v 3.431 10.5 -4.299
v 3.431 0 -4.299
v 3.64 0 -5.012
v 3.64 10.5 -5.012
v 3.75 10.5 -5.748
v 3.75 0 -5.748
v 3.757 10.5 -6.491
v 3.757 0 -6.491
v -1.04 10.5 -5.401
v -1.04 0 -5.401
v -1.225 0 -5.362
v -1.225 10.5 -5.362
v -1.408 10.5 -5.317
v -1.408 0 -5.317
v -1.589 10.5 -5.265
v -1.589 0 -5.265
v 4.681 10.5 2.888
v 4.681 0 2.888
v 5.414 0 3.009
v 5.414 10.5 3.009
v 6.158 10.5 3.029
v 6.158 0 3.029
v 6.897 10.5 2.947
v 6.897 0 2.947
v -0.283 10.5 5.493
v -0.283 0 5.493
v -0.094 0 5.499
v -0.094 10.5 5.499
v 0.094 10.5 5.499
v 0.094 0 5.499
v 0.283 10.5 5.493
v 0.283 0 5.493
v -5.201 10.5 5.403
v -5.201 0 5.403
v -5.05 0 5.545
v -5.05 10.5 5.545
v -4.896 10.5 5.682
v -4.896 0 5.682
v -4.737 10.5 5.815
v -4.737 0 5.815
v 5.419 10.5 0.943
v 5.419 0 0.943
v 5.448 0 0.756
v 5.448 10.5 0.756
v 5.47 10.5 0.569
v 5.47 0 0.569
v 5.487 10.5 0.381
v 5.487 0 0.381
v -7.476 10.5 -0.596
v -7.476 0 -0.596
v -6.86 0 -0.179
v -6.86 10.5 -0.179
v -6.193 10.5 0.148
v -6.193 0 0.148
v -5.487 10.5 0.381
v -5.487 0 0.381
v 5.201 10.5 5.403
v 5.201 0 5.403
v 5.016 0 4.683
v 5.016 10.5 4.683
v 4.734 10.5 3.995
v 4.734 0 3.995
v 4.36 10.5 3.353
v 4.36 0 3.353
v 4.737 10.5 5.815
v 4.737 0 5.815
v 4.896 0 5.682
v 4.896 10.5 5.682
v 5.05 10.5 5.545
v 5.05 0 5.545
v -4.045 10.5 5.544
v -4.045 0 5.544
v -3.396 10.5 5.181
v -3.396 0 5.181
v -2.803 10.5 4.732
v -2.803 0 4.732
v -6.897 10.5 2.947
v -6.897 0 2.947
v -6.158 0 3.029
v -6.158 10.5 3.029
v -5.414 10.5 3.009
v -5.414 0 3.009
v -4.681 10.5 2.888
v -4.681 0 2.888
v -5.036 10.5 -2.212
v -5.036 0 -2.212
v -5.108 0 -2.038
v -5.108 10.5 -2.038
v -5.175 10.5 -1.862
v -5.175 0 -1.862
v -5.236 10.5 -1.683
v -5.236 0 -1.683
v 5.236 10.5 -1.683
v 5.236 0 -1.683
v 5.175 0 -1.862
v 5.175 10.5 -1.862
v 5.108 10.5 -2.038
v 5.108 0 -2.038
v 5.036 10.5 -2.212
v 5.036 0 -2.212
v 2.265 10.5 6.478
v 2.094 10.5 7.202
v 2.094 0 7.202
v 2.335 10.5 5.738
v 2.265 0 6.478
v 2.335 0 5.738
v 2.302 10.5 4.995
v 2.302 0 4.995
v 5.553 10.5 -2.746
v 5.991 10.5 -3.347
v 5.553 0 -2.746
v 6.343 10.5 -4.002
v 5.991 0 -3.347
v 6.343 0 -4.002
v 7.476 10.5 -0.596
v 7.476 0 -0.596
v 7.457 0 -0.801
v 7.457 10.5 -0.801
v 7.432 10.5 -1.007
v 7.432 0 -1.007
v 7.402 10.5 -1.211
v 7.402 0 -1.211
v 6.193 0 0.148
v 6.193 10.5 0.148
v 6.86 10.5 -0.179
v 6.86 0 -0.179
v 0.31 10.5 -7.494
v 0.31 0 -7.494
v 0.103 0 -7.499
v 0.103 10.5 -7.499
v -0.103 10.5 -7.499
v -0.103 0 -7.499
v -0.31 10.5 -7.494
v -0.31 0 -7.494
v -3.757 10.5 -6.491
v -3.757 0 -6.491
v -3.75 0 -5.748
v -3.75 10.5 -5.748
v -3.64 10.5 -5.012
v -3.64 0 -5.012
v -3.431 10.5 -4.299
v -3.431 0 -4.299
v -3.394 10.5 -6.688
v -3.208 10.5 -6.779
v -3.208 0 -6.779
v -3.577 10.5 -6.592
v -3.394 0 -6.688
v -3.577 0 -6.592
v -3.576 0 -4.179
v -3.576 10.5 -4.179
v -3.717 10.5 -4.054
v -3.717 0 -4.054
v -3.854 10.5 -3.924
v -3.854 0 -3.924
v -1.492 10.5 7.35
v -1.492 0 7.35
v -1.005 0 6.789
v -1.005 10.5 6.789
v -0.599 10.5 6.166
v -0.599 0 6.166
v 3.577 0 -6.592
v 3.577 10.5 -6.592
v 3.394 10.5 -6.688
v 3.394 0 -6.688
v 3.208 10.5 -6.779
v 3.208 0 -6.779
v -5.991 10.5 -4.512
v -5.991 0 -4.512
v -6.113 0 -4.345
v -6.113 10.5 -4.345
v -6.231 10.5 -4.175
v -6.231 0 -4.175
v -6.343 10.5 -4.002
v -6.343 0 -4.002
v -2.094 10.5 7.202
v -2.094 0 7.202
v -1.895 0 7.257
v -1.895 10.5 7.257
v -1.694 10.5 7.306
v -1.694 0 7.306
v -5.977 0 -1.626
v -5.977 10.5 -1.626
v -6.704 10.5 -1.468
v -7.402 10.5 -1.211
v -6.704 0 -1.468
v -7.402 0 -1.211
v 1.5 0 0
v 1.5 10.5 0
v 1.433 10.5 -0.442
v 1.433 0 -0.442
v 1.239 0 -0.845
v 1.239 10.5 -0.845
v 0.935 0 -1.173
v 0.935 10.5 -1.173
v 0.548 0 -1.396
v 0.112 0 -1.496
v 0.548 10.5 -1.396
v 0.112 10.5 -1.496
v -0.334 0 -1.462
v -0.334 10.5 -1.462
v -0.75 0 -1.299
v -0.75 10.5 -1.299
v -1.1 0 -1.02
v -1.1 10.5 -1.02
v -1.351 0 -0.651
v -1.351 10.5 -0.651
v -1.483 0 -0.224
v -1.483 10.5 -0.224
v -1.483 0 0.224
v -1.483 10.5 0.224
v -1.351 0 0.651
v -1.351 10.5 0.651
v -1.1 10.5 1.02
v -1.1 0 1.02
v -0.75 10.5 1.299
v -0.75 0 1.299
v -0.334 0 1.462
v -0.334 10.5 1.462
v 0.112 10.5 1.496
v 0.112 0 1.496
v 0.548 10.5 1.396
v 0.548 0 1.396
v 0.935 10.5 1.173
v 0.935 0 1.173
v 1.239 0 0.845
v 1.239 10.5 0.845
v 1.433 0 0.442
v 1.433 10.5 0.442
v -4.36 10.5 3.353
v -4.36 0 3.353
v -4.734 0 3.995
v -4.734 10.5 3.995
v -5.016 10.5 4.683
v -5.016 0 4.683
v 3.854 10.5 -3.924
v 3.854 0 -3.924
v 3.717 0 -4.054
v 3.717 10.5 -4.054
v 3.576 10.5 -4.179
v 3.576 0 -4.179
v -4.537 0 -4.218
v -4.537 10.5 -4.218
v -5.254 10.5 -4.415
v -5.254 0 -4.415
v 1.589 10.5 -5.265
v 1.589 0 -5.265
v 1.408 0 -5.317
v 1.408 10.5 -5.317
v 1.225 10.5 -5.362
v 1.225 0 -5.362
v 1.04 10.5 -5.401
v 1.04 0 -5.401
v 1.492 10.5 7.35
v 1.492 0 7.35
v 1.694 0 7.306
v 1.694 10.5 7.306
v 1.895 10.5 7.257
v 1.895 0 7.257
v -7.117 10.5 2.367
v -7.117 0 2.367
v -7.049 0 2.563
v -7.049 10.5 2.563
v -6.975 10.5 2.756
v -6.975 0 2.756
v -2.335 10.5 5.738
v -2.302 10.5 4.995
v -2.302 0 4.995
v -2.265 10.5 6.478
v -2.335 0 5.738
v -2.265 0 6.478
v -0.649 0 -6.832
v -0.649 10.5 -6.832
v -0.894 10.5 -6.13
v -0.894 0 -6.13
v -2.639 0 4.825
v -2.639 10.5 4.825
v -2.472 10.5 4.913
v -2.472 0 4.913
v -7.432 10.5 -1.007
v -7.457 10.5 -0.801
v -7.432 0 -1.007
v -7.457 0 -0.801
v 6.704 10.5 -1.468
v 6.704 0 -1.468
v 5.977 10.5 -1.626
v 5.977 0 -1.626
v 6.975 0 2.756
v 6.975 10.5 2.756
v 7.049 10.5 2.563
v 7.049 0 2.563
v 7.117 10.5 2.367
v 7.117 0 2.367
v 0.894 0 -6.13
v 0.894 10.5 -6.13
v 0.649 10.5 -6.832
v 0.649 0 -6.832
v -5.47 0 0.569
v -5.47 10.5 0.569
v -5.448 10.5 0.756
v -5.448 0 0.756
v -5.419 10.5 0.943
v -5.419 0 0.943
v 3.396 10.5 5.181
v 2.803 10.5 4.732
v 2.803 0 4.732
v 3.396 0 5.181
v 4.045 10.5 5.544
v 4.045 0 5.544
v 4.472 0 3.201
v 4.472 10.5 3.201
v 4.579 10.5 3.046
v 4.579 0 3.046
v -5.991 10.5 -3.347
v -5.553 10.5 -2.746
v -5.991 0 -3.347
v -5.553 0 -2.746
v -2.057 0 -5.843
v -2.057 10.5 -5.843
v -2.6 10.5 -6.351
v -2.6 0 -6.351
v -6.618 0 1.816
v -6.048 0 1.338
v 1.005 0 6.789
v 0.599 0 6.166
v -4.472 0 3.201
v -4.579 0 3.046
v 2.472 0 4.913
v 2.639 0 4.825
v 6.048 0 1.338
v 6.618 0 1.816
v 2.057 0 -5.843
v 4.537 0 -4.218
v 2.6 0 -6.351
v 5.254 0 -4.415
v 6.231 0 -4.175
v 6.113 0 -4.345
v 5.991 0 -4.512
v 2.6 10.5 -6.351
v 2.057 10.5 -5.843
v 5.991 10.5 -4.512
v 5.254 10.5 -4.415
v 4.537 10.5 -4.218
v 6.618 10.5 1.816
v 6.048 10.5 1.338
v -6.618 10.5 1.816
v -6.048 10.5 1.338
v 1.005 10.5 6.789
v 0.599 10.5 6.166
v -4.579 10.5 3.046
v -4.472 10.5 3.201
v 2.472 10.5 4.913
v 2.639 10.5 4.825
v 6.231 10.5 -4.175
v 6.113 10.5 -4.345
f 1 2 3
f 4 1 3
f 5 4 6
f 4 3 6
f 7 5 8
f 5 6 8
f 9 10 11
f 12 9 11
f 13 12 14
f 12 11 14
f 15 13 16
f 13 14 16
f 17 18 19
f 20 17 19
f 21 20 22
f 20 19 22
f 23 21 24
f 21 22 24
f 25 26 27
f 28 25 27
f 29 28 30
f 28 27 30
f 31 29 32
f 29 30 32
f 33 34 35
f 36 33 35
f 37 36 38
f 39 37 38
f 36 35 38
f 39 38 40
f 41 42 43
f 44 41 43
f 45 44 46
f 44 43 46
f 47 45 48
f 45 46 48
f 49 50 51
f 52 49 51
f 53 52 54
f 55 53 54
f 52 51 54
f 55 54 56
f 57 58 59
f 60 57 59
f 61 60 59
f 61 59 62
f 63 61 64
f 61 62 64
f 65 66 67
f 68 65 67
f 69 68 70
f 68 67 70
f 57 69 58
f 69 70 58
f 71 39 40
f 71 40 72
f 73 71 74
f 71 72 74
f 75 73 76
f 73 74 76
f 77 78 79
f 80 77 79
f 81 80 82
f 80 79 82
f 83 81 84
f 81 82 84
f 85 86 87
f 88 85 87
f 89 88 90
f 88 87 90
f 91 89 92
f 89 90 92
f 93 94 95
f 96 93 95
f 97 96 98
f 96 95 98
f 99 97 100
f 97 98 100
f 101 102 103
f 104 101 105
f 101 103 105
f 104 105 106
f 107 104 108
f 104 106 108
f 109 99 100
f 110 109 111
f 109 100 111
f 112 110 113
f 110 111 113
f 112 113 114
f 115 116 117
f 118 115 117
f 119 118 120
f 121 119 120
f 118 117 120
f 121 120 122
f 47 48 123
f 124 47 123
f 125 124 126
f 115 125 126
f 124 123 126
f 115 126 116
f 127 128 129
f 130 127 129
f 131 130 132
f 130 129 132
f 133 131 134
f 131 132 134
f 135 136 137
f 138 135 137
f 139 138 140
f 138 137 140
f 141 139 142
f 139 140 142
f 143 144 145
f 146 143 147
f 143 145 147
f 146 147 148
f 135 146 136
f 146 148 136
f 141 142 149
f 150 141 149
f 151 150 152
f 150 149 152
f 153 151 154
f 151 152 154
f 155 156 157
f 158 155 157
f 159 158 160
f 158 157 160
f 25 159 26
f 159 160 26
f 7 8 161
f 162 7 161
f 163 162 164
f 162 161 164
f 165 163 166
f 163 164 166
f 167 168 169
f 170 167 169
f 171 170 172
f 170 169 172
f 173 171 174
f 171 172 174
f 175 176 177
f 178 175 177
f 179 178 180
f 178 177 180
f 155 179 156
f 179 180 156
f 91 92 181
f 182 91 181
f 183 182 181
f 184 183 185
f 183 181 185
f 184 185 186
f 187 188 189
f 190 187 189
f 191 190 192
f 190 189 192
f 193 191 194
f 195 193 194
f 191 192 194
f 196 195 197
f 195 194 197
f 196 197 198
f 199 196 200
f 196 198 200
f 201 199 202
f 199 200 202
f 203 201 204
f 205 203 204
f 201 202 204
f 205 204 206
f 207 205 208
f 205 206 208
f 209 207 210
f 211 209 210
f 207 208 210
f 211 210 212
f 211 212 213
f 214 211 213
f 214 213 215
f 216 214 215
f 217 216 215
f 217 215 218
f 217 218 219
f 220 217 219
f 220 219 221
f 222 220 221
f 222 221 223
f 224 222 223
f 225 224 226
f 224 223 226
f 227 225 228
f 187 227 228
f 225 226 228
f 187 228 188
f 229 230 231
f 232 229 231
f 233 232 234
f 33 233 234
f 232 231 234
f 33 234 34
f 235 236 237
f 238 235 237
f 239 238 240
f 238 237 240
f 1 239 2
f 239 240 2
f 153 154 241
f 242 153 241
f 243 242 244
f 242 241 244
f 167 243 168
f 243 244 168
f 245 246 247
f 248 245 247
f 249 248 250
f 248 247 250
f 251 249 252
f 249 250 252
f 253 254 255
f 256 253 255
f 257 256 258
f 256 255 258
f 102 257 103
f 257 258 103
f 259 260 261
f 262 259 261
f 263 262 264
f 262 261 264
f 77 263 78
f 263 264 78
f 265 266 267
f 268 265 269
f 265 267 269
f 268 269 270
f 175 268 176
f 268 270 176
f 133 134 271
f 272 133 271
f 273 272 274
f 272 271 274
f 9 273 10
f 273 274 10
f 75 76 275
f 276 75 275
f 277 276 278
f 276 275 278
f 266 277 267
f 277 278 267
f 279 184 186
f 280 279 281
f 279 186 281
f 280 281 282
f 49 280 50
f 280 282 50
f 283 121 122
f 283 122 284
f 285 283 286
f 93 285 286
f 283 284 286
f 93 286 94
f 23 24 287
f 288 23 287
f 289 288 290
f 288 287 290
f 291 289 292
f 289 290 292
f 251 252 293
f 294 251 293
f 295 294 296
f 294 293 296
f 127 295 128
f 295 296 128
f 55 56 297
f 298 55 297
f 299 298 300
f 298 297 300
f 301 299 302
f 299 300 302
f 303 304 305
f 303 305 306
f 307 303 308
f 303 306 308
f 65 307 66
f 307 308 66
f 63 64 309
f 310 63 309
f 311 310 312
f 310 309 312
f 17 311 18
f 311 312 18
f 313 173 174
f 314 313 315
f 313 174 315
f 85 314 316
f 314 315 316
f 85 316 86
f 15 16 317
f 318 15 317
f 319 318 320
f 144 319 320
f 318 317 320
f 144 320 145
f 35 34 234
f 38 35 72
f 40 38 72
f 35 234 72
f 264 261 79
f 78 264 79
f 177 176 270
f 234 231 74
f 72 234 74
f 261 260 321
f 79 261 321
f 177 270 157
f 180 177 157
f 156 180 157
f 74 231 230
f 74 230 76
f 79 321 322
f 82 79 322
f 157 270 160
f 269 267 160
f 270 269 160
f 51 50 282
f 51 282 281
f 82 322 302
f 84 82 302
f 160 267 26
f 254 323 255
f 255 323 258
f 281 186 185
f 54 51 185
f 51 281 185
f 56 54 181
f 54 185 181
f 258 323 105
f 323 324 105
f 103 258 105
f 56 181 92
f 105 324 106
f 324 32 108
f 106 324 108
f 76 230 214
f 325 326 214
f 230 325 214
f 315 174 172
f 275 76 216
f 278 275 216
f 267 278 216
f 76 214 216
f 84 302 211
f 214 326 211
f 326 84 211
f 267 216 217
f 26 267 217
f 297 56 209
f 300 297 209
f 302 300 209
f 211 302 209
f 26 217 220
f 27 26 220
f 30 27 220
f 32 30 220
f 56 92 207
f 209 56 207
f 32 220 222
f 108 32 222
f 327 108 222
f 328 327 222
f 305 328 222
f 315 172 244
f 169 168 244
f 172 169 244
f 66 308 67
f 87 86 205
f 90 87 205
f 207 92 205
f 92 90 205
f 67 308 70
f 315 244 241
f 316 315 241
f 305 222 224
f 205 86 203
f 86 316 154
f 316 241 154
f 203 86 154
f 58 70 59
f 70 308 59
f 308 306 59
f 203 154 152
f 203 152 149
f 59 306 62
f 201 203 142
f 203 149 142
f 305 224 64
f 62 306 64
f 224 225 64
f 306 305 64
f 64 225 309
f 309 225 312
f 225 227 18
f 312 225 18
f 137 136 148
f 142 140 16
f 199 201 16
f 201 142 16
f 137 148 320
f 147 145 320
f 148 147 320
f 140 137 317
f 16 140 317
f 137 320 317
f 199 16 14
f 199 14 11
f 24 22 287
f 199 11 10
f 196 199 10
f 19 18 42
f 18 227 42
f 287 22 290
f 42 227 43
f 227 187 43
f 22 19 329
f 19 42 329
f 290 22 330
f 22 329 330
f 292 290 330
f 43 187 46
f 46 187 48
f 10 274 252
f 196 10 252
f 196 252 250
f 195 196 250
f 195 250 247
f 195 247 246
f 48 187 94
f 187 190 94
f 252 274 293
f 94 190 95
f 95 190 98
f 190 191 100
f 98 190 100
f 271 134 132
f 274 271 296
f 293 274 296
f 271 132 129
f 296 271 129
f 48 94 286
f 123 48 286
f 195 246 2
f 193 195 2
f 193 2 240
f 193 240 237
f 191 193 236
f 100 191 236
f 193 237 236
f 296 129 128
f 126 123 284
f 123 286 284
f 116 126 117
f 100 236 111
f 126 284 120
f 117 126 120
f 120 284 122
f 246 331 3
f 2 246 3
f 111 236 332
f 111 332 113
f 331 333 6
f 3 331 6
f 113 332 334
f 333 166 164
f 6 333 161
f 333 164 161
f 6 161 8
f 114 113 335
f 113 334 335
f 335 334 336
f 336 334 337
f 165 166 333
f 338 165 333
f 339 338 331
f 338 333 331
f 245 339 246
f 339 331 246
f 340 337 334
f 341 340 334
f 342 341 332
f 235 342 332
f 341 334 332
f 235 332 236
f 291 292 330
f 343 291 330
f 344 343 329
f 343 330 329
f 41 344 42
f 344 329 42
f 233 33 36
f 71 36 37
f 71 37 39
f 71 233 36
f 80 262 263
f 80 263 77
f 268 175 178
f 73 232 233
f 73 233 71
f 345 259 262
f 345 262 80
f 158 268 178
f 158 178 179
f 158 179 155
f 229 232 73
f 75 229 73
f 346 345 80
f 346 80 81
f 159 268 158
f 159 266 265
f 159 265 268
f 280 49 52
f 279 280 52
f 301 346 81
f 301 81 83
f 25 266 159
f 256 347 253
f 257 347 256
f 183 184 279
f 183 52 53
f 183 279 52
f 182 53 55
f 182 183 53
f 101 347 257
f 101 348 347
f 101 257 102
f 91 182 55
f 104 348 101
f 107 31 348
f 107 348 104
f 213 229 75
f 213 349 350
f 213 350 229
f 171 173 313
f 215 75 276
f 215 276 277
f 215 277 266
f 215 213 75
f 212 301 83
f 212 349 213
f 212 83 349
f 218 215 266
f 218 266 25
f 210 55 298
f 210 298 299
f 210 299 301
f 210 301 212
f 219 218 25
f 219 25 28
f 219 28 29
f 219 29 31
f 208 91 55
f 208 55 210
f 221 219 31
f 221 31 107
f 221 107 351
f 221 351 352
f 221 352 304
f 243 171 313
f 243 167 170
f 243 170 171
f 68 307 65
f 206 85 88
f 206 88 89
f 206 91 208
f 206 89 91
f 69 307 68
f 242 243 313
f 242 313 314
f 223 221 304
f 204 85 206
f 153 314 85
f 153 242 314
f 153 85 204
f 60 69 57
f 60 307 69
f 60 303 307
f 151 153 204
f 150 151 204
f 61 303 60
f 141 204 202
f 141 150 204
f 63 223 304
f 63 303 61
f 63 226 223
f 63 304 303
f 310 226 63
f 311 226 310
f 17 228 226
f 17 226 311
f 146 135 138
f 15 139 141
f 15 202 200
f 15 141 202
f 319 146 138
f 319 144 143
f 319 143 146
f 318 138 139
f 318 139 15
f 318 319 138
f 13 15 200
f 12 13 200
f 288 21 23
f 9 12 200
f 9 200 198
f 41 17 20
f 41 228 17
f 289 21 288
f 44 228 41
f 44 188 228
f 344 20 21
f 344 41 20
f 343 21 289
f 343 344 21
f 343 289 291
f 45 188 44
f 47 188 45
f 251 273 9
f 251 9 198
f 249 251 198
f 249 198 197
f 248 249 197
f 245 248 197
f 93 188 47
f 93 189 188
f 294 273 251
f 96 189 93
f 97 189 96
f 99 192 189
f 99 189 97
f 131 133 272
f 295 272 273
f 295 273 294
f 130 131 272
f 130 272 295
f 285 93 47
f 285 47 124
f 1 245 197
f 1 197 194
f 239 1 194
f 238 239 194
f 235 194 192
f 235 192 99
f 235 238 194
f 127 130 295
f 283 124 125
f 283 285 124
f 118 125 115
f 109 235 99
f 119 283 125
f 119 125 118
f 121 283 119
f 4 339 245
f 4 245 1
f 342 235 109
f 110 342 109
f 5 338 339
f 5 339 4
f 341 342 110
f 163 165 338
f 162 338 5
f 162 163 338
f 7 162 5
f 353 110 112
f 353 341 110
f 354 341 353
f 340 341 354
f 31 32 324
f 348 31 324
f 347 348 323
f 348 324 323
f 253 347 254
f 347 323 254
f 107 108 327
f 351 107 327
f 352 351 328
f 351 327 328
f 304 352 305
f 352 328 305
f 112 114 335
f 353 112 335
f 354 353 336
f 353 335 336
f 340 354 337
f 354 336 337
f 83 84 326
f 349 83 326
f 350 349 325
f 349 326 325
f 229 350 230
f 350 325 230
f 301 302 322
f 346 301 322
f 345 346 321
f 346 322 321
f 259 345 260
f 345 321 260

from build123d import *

# Parameters (mm, degrees)
BOSS_EXTRUDE1_DEPTH = 10.5
SKETCH2_R           = 1.5
CUT_EXTRUDE1_DEPTH  = 10.5


with BuildPart() as part:
    # Sketch1 → Boss-Extrude1 (new body)
    with BuildSketch(Plane(origin=(0, 0, 0), x_dir=(1, 0, 0), z_dir=(0, 1, 0))):
        with BuildLine():
            ThreePointArc((1.04, 5.400777722), (0.783531714, 6.485041414), (0.31, 7.493590595))
            ThreePointArc((0.31, 7.493590595), (0, 7.5), (-0.31, 7.493590595))
            ThreePointArc((-0.31, 7.493590595), (-0.783531714, 6.485041414), (-1.04, 5.400777722))
            ThreePointArc((-1.04, 5.400777722), (-1.316236154, 5.340179996), (-1.588992288, 5.265463276))
            ThreePointArc((-1.588992288, 5.265463276), (-2.319966139, 6.10634434), (-3.207953823, 6.779309129))
            ThreePointArc((-3.207953823, 6.779309129), (-3.48542379, 6.640920192), (-3.756936559, 6.491180762))
            ThreePointArc((-3.756936559, 6.491180762), (-3.707531894, 5.378093653), (-3.430740821, 4.298839078))
            ThreePointArc((-3.430740821, 4.298839078), (-3.64717462, 4.116809115), (-3.853965592, 3.923894649))
            ThreePointArc((-3.853965592, 3.923894649), (-4.891987708, 4.328757368), (-5.991004086, 4.511969642))
            ThreePointArc((-5.991004086, 4.511969642), (-6.172378994, 4.2604856), (-6.343204228, 4.001719645))
            ThreePointArc((-6.343204228, 4.001719645), (-5.782181198, 3.039089449), (-5.035540265, 2.212088208))
            ThreePointArc((-5.035540265, 2.212088208), (-5.142589335, 1.950326879), (-5.236041824, 1.683409046))
            ThreePointArc((-5.236041824, 1.683409046), (-6.343313848, 1.559504249), (-7.401587511, 1.210992284))
            ThreePointArc((-7.401587511, 1.210992284), (-7.445316556, 0.904025102), (-7.476320253, 0.595512782))
            ThreePointArc((-7.476320253, 0.595512782), (-6.532202472, 0.003866477), (-5.486758119, -0.381425412))
            ThreePointArc((-5.486758119, -0.381425412), (-5.459898808, -0.662951741), (-5.418603976, -0.942725282))
            ThreePointArc((-5.418603976, -0.942725282), (-6.341463231, -1.567012498), (-7.116556437, -2.367408811))
            ThreePointArc((-7.116556437, -2.367408811), (-7.01262182, -2.659536653), (-6.896701407, -2.947118882))
            ThreePointArc((-6.896701407, -2.947118882), (-5.785774881, -3.032242258), (-4.68102581, -2.887559066))
            ThreePointArc((-4.68102581, -2.887559066), (-4.526411262, -3.124356107), (-4.359829258, -3.352892609))
            ThreePointArc((-4.359829258, -3.352892609), (-4.886859811, -4.334545567), (-5.201208047, -5.403465078))
            ThreePointArc((-5.201208047, -5.403465078), (-4.973419937, -5.613830611), (-4.737131383, -5.814601127))
            ThreePointArc((-4.737131383, -5.814601127), (-3.713895991, -5.373700834), (-2.802926901, -4.732187738))
            ThreePointArc((-2.802926901, -4.732187738), (-2.555977446, -4.870008141), (-2.302270198, -4.994952646))
            ThreePointArc((-2.302270198, -4.994952646), (-2.312735701, -6.109086484), (-2.094325574, -7.201652615))
            ThreePointArc((-2.094325574, -7.201652615), (-1.794867482, -7.282063631), (-1.492341648, -7.350028327))
            ThreePointArc((-1.492341648, -7.350028327), (-0.791208287, -6.484109309), (-0.282711218, -5.492729228))
            ThreePointArc((-0.282711218, -5.492729228), (0, -5.5), (0.282711218, -5.492729228))
            ThreePointArc((0.282711218, -5.492729228), (0.791208287, -6.484109309), (1.492341648, -7.350028327))
            ThreePointArc((1.492341648, -7.350028327), (1.794867482, -7.282063631), (2.094325574, -7.201652615))
            ThreePointArc((2.094325574, -7.201652615), (2.312735701, -6.109086484), (2.302270198, -4.994952646))
            ThreePointArc((2.302270198, -4.994952646), (2.555977446, -4.870008141), (2.802926901, -4.732187738))
            ThreePointArc((2.802926901, -4.732187738), (3.713895991, -5.373700834), (4.737131383, -5.814601127))
            ThreePointArc((4.737131383, -5.814601127), (4.973419937, -5.613830611), (5.201208047, -5.403465078))
            ThreePointArc((5.201208047, -5.403465078), (4.886859811, -4.334545567), (4.359829258, -3.352892609))
            ThreePointArc((4.359829258, -3.352892609), (4.526411262, -3.124356107), (4.68102581, -2.887559066))
            ThreePointArc((4.68102581, -2.887559066), (5.785774881, -3.032242258), (6.896701407, -2.947118882))
            ThreePointArc((6.896701407, -2.947118882), (7.01262182, -2.659536653), (7.116556437, -2.367408811))
            ThreePointArc((7.116556437, -2.367408811), (6.341463231, -1.567012498), (5.418603976, -0.942725282))
            ThreePointArc((5.418603976, -0.942725282), (5.459898808, -0.662951741), (5.486758119, -0.381425412))
            ThreePointArc((5.486758119, -0.381425412), (6.532202472, 0.003866477), (7.476320253, 0.595512782))
            ThreePointArc((7.476320253, 0.595512782), (7.445316556, 0.904025102), (7.401587511, 1.210992284))
            ThreePointArc((7.401587511, 1.210992284), (6.343313848, 1.559504249), (5.236041824, 1.683409046))
            ThreePointArc((5.236041824, 1.683409046), (5.142589335, 1.950326879), (5.035540265, 2.212088208))
            ThreePointArc((5.035540265, 2.212088208), (5.782181198, 3.039089449), (6.343204228, 4.001719645))
            ThreePointArc((6.343204228, 4.001719645), (6.172378994, 4.2604856), (5.991004086, 4.511969642))
            ThreePointArc((5.991004086, 4.511969642), (4.891987708, 4.328757368), (3.853965592, 3.923894649))
            ThreePointArc((3.853965592, 3.923894649), (3.64717462, 4.116809115), (3.430740821, 4.298839078))
            ThreePointArc((3.430740821, 4.298839078), (3.707531894, 5.378093653), (3.756936559, 6.491180762))
            ThreePointArc((3.756936559, 6.491180762), (3.48542379, 6.640920192), (3.207953823, 6.779309129))
            ThreePointArc((3.207953823, 6.779309129), (2.319966139, 6.10634434), (1.588992288, 5.265463276))
            ThreePointArc((1.588992288, 5.265463276), (1.316236154, 5.340179996), (1.04, 5.400777722))
        make_face()
    extrude(amount=BOSS_EXTRUDE1_DEPTH)

    # Sketch2 → Cut-Extrude1 (cut)
    with BuildSketch(Plane(origin=(0, 10.5, 0), x_dir=(1, 0, 0), z_dir=(0, 1, 0))):
        Circle(SKETCH2_R)
    extrude(amount=-CUT_EXTRUDE1_DEPTH, mode=Mode.SUBTRACT)


solid = part.part
